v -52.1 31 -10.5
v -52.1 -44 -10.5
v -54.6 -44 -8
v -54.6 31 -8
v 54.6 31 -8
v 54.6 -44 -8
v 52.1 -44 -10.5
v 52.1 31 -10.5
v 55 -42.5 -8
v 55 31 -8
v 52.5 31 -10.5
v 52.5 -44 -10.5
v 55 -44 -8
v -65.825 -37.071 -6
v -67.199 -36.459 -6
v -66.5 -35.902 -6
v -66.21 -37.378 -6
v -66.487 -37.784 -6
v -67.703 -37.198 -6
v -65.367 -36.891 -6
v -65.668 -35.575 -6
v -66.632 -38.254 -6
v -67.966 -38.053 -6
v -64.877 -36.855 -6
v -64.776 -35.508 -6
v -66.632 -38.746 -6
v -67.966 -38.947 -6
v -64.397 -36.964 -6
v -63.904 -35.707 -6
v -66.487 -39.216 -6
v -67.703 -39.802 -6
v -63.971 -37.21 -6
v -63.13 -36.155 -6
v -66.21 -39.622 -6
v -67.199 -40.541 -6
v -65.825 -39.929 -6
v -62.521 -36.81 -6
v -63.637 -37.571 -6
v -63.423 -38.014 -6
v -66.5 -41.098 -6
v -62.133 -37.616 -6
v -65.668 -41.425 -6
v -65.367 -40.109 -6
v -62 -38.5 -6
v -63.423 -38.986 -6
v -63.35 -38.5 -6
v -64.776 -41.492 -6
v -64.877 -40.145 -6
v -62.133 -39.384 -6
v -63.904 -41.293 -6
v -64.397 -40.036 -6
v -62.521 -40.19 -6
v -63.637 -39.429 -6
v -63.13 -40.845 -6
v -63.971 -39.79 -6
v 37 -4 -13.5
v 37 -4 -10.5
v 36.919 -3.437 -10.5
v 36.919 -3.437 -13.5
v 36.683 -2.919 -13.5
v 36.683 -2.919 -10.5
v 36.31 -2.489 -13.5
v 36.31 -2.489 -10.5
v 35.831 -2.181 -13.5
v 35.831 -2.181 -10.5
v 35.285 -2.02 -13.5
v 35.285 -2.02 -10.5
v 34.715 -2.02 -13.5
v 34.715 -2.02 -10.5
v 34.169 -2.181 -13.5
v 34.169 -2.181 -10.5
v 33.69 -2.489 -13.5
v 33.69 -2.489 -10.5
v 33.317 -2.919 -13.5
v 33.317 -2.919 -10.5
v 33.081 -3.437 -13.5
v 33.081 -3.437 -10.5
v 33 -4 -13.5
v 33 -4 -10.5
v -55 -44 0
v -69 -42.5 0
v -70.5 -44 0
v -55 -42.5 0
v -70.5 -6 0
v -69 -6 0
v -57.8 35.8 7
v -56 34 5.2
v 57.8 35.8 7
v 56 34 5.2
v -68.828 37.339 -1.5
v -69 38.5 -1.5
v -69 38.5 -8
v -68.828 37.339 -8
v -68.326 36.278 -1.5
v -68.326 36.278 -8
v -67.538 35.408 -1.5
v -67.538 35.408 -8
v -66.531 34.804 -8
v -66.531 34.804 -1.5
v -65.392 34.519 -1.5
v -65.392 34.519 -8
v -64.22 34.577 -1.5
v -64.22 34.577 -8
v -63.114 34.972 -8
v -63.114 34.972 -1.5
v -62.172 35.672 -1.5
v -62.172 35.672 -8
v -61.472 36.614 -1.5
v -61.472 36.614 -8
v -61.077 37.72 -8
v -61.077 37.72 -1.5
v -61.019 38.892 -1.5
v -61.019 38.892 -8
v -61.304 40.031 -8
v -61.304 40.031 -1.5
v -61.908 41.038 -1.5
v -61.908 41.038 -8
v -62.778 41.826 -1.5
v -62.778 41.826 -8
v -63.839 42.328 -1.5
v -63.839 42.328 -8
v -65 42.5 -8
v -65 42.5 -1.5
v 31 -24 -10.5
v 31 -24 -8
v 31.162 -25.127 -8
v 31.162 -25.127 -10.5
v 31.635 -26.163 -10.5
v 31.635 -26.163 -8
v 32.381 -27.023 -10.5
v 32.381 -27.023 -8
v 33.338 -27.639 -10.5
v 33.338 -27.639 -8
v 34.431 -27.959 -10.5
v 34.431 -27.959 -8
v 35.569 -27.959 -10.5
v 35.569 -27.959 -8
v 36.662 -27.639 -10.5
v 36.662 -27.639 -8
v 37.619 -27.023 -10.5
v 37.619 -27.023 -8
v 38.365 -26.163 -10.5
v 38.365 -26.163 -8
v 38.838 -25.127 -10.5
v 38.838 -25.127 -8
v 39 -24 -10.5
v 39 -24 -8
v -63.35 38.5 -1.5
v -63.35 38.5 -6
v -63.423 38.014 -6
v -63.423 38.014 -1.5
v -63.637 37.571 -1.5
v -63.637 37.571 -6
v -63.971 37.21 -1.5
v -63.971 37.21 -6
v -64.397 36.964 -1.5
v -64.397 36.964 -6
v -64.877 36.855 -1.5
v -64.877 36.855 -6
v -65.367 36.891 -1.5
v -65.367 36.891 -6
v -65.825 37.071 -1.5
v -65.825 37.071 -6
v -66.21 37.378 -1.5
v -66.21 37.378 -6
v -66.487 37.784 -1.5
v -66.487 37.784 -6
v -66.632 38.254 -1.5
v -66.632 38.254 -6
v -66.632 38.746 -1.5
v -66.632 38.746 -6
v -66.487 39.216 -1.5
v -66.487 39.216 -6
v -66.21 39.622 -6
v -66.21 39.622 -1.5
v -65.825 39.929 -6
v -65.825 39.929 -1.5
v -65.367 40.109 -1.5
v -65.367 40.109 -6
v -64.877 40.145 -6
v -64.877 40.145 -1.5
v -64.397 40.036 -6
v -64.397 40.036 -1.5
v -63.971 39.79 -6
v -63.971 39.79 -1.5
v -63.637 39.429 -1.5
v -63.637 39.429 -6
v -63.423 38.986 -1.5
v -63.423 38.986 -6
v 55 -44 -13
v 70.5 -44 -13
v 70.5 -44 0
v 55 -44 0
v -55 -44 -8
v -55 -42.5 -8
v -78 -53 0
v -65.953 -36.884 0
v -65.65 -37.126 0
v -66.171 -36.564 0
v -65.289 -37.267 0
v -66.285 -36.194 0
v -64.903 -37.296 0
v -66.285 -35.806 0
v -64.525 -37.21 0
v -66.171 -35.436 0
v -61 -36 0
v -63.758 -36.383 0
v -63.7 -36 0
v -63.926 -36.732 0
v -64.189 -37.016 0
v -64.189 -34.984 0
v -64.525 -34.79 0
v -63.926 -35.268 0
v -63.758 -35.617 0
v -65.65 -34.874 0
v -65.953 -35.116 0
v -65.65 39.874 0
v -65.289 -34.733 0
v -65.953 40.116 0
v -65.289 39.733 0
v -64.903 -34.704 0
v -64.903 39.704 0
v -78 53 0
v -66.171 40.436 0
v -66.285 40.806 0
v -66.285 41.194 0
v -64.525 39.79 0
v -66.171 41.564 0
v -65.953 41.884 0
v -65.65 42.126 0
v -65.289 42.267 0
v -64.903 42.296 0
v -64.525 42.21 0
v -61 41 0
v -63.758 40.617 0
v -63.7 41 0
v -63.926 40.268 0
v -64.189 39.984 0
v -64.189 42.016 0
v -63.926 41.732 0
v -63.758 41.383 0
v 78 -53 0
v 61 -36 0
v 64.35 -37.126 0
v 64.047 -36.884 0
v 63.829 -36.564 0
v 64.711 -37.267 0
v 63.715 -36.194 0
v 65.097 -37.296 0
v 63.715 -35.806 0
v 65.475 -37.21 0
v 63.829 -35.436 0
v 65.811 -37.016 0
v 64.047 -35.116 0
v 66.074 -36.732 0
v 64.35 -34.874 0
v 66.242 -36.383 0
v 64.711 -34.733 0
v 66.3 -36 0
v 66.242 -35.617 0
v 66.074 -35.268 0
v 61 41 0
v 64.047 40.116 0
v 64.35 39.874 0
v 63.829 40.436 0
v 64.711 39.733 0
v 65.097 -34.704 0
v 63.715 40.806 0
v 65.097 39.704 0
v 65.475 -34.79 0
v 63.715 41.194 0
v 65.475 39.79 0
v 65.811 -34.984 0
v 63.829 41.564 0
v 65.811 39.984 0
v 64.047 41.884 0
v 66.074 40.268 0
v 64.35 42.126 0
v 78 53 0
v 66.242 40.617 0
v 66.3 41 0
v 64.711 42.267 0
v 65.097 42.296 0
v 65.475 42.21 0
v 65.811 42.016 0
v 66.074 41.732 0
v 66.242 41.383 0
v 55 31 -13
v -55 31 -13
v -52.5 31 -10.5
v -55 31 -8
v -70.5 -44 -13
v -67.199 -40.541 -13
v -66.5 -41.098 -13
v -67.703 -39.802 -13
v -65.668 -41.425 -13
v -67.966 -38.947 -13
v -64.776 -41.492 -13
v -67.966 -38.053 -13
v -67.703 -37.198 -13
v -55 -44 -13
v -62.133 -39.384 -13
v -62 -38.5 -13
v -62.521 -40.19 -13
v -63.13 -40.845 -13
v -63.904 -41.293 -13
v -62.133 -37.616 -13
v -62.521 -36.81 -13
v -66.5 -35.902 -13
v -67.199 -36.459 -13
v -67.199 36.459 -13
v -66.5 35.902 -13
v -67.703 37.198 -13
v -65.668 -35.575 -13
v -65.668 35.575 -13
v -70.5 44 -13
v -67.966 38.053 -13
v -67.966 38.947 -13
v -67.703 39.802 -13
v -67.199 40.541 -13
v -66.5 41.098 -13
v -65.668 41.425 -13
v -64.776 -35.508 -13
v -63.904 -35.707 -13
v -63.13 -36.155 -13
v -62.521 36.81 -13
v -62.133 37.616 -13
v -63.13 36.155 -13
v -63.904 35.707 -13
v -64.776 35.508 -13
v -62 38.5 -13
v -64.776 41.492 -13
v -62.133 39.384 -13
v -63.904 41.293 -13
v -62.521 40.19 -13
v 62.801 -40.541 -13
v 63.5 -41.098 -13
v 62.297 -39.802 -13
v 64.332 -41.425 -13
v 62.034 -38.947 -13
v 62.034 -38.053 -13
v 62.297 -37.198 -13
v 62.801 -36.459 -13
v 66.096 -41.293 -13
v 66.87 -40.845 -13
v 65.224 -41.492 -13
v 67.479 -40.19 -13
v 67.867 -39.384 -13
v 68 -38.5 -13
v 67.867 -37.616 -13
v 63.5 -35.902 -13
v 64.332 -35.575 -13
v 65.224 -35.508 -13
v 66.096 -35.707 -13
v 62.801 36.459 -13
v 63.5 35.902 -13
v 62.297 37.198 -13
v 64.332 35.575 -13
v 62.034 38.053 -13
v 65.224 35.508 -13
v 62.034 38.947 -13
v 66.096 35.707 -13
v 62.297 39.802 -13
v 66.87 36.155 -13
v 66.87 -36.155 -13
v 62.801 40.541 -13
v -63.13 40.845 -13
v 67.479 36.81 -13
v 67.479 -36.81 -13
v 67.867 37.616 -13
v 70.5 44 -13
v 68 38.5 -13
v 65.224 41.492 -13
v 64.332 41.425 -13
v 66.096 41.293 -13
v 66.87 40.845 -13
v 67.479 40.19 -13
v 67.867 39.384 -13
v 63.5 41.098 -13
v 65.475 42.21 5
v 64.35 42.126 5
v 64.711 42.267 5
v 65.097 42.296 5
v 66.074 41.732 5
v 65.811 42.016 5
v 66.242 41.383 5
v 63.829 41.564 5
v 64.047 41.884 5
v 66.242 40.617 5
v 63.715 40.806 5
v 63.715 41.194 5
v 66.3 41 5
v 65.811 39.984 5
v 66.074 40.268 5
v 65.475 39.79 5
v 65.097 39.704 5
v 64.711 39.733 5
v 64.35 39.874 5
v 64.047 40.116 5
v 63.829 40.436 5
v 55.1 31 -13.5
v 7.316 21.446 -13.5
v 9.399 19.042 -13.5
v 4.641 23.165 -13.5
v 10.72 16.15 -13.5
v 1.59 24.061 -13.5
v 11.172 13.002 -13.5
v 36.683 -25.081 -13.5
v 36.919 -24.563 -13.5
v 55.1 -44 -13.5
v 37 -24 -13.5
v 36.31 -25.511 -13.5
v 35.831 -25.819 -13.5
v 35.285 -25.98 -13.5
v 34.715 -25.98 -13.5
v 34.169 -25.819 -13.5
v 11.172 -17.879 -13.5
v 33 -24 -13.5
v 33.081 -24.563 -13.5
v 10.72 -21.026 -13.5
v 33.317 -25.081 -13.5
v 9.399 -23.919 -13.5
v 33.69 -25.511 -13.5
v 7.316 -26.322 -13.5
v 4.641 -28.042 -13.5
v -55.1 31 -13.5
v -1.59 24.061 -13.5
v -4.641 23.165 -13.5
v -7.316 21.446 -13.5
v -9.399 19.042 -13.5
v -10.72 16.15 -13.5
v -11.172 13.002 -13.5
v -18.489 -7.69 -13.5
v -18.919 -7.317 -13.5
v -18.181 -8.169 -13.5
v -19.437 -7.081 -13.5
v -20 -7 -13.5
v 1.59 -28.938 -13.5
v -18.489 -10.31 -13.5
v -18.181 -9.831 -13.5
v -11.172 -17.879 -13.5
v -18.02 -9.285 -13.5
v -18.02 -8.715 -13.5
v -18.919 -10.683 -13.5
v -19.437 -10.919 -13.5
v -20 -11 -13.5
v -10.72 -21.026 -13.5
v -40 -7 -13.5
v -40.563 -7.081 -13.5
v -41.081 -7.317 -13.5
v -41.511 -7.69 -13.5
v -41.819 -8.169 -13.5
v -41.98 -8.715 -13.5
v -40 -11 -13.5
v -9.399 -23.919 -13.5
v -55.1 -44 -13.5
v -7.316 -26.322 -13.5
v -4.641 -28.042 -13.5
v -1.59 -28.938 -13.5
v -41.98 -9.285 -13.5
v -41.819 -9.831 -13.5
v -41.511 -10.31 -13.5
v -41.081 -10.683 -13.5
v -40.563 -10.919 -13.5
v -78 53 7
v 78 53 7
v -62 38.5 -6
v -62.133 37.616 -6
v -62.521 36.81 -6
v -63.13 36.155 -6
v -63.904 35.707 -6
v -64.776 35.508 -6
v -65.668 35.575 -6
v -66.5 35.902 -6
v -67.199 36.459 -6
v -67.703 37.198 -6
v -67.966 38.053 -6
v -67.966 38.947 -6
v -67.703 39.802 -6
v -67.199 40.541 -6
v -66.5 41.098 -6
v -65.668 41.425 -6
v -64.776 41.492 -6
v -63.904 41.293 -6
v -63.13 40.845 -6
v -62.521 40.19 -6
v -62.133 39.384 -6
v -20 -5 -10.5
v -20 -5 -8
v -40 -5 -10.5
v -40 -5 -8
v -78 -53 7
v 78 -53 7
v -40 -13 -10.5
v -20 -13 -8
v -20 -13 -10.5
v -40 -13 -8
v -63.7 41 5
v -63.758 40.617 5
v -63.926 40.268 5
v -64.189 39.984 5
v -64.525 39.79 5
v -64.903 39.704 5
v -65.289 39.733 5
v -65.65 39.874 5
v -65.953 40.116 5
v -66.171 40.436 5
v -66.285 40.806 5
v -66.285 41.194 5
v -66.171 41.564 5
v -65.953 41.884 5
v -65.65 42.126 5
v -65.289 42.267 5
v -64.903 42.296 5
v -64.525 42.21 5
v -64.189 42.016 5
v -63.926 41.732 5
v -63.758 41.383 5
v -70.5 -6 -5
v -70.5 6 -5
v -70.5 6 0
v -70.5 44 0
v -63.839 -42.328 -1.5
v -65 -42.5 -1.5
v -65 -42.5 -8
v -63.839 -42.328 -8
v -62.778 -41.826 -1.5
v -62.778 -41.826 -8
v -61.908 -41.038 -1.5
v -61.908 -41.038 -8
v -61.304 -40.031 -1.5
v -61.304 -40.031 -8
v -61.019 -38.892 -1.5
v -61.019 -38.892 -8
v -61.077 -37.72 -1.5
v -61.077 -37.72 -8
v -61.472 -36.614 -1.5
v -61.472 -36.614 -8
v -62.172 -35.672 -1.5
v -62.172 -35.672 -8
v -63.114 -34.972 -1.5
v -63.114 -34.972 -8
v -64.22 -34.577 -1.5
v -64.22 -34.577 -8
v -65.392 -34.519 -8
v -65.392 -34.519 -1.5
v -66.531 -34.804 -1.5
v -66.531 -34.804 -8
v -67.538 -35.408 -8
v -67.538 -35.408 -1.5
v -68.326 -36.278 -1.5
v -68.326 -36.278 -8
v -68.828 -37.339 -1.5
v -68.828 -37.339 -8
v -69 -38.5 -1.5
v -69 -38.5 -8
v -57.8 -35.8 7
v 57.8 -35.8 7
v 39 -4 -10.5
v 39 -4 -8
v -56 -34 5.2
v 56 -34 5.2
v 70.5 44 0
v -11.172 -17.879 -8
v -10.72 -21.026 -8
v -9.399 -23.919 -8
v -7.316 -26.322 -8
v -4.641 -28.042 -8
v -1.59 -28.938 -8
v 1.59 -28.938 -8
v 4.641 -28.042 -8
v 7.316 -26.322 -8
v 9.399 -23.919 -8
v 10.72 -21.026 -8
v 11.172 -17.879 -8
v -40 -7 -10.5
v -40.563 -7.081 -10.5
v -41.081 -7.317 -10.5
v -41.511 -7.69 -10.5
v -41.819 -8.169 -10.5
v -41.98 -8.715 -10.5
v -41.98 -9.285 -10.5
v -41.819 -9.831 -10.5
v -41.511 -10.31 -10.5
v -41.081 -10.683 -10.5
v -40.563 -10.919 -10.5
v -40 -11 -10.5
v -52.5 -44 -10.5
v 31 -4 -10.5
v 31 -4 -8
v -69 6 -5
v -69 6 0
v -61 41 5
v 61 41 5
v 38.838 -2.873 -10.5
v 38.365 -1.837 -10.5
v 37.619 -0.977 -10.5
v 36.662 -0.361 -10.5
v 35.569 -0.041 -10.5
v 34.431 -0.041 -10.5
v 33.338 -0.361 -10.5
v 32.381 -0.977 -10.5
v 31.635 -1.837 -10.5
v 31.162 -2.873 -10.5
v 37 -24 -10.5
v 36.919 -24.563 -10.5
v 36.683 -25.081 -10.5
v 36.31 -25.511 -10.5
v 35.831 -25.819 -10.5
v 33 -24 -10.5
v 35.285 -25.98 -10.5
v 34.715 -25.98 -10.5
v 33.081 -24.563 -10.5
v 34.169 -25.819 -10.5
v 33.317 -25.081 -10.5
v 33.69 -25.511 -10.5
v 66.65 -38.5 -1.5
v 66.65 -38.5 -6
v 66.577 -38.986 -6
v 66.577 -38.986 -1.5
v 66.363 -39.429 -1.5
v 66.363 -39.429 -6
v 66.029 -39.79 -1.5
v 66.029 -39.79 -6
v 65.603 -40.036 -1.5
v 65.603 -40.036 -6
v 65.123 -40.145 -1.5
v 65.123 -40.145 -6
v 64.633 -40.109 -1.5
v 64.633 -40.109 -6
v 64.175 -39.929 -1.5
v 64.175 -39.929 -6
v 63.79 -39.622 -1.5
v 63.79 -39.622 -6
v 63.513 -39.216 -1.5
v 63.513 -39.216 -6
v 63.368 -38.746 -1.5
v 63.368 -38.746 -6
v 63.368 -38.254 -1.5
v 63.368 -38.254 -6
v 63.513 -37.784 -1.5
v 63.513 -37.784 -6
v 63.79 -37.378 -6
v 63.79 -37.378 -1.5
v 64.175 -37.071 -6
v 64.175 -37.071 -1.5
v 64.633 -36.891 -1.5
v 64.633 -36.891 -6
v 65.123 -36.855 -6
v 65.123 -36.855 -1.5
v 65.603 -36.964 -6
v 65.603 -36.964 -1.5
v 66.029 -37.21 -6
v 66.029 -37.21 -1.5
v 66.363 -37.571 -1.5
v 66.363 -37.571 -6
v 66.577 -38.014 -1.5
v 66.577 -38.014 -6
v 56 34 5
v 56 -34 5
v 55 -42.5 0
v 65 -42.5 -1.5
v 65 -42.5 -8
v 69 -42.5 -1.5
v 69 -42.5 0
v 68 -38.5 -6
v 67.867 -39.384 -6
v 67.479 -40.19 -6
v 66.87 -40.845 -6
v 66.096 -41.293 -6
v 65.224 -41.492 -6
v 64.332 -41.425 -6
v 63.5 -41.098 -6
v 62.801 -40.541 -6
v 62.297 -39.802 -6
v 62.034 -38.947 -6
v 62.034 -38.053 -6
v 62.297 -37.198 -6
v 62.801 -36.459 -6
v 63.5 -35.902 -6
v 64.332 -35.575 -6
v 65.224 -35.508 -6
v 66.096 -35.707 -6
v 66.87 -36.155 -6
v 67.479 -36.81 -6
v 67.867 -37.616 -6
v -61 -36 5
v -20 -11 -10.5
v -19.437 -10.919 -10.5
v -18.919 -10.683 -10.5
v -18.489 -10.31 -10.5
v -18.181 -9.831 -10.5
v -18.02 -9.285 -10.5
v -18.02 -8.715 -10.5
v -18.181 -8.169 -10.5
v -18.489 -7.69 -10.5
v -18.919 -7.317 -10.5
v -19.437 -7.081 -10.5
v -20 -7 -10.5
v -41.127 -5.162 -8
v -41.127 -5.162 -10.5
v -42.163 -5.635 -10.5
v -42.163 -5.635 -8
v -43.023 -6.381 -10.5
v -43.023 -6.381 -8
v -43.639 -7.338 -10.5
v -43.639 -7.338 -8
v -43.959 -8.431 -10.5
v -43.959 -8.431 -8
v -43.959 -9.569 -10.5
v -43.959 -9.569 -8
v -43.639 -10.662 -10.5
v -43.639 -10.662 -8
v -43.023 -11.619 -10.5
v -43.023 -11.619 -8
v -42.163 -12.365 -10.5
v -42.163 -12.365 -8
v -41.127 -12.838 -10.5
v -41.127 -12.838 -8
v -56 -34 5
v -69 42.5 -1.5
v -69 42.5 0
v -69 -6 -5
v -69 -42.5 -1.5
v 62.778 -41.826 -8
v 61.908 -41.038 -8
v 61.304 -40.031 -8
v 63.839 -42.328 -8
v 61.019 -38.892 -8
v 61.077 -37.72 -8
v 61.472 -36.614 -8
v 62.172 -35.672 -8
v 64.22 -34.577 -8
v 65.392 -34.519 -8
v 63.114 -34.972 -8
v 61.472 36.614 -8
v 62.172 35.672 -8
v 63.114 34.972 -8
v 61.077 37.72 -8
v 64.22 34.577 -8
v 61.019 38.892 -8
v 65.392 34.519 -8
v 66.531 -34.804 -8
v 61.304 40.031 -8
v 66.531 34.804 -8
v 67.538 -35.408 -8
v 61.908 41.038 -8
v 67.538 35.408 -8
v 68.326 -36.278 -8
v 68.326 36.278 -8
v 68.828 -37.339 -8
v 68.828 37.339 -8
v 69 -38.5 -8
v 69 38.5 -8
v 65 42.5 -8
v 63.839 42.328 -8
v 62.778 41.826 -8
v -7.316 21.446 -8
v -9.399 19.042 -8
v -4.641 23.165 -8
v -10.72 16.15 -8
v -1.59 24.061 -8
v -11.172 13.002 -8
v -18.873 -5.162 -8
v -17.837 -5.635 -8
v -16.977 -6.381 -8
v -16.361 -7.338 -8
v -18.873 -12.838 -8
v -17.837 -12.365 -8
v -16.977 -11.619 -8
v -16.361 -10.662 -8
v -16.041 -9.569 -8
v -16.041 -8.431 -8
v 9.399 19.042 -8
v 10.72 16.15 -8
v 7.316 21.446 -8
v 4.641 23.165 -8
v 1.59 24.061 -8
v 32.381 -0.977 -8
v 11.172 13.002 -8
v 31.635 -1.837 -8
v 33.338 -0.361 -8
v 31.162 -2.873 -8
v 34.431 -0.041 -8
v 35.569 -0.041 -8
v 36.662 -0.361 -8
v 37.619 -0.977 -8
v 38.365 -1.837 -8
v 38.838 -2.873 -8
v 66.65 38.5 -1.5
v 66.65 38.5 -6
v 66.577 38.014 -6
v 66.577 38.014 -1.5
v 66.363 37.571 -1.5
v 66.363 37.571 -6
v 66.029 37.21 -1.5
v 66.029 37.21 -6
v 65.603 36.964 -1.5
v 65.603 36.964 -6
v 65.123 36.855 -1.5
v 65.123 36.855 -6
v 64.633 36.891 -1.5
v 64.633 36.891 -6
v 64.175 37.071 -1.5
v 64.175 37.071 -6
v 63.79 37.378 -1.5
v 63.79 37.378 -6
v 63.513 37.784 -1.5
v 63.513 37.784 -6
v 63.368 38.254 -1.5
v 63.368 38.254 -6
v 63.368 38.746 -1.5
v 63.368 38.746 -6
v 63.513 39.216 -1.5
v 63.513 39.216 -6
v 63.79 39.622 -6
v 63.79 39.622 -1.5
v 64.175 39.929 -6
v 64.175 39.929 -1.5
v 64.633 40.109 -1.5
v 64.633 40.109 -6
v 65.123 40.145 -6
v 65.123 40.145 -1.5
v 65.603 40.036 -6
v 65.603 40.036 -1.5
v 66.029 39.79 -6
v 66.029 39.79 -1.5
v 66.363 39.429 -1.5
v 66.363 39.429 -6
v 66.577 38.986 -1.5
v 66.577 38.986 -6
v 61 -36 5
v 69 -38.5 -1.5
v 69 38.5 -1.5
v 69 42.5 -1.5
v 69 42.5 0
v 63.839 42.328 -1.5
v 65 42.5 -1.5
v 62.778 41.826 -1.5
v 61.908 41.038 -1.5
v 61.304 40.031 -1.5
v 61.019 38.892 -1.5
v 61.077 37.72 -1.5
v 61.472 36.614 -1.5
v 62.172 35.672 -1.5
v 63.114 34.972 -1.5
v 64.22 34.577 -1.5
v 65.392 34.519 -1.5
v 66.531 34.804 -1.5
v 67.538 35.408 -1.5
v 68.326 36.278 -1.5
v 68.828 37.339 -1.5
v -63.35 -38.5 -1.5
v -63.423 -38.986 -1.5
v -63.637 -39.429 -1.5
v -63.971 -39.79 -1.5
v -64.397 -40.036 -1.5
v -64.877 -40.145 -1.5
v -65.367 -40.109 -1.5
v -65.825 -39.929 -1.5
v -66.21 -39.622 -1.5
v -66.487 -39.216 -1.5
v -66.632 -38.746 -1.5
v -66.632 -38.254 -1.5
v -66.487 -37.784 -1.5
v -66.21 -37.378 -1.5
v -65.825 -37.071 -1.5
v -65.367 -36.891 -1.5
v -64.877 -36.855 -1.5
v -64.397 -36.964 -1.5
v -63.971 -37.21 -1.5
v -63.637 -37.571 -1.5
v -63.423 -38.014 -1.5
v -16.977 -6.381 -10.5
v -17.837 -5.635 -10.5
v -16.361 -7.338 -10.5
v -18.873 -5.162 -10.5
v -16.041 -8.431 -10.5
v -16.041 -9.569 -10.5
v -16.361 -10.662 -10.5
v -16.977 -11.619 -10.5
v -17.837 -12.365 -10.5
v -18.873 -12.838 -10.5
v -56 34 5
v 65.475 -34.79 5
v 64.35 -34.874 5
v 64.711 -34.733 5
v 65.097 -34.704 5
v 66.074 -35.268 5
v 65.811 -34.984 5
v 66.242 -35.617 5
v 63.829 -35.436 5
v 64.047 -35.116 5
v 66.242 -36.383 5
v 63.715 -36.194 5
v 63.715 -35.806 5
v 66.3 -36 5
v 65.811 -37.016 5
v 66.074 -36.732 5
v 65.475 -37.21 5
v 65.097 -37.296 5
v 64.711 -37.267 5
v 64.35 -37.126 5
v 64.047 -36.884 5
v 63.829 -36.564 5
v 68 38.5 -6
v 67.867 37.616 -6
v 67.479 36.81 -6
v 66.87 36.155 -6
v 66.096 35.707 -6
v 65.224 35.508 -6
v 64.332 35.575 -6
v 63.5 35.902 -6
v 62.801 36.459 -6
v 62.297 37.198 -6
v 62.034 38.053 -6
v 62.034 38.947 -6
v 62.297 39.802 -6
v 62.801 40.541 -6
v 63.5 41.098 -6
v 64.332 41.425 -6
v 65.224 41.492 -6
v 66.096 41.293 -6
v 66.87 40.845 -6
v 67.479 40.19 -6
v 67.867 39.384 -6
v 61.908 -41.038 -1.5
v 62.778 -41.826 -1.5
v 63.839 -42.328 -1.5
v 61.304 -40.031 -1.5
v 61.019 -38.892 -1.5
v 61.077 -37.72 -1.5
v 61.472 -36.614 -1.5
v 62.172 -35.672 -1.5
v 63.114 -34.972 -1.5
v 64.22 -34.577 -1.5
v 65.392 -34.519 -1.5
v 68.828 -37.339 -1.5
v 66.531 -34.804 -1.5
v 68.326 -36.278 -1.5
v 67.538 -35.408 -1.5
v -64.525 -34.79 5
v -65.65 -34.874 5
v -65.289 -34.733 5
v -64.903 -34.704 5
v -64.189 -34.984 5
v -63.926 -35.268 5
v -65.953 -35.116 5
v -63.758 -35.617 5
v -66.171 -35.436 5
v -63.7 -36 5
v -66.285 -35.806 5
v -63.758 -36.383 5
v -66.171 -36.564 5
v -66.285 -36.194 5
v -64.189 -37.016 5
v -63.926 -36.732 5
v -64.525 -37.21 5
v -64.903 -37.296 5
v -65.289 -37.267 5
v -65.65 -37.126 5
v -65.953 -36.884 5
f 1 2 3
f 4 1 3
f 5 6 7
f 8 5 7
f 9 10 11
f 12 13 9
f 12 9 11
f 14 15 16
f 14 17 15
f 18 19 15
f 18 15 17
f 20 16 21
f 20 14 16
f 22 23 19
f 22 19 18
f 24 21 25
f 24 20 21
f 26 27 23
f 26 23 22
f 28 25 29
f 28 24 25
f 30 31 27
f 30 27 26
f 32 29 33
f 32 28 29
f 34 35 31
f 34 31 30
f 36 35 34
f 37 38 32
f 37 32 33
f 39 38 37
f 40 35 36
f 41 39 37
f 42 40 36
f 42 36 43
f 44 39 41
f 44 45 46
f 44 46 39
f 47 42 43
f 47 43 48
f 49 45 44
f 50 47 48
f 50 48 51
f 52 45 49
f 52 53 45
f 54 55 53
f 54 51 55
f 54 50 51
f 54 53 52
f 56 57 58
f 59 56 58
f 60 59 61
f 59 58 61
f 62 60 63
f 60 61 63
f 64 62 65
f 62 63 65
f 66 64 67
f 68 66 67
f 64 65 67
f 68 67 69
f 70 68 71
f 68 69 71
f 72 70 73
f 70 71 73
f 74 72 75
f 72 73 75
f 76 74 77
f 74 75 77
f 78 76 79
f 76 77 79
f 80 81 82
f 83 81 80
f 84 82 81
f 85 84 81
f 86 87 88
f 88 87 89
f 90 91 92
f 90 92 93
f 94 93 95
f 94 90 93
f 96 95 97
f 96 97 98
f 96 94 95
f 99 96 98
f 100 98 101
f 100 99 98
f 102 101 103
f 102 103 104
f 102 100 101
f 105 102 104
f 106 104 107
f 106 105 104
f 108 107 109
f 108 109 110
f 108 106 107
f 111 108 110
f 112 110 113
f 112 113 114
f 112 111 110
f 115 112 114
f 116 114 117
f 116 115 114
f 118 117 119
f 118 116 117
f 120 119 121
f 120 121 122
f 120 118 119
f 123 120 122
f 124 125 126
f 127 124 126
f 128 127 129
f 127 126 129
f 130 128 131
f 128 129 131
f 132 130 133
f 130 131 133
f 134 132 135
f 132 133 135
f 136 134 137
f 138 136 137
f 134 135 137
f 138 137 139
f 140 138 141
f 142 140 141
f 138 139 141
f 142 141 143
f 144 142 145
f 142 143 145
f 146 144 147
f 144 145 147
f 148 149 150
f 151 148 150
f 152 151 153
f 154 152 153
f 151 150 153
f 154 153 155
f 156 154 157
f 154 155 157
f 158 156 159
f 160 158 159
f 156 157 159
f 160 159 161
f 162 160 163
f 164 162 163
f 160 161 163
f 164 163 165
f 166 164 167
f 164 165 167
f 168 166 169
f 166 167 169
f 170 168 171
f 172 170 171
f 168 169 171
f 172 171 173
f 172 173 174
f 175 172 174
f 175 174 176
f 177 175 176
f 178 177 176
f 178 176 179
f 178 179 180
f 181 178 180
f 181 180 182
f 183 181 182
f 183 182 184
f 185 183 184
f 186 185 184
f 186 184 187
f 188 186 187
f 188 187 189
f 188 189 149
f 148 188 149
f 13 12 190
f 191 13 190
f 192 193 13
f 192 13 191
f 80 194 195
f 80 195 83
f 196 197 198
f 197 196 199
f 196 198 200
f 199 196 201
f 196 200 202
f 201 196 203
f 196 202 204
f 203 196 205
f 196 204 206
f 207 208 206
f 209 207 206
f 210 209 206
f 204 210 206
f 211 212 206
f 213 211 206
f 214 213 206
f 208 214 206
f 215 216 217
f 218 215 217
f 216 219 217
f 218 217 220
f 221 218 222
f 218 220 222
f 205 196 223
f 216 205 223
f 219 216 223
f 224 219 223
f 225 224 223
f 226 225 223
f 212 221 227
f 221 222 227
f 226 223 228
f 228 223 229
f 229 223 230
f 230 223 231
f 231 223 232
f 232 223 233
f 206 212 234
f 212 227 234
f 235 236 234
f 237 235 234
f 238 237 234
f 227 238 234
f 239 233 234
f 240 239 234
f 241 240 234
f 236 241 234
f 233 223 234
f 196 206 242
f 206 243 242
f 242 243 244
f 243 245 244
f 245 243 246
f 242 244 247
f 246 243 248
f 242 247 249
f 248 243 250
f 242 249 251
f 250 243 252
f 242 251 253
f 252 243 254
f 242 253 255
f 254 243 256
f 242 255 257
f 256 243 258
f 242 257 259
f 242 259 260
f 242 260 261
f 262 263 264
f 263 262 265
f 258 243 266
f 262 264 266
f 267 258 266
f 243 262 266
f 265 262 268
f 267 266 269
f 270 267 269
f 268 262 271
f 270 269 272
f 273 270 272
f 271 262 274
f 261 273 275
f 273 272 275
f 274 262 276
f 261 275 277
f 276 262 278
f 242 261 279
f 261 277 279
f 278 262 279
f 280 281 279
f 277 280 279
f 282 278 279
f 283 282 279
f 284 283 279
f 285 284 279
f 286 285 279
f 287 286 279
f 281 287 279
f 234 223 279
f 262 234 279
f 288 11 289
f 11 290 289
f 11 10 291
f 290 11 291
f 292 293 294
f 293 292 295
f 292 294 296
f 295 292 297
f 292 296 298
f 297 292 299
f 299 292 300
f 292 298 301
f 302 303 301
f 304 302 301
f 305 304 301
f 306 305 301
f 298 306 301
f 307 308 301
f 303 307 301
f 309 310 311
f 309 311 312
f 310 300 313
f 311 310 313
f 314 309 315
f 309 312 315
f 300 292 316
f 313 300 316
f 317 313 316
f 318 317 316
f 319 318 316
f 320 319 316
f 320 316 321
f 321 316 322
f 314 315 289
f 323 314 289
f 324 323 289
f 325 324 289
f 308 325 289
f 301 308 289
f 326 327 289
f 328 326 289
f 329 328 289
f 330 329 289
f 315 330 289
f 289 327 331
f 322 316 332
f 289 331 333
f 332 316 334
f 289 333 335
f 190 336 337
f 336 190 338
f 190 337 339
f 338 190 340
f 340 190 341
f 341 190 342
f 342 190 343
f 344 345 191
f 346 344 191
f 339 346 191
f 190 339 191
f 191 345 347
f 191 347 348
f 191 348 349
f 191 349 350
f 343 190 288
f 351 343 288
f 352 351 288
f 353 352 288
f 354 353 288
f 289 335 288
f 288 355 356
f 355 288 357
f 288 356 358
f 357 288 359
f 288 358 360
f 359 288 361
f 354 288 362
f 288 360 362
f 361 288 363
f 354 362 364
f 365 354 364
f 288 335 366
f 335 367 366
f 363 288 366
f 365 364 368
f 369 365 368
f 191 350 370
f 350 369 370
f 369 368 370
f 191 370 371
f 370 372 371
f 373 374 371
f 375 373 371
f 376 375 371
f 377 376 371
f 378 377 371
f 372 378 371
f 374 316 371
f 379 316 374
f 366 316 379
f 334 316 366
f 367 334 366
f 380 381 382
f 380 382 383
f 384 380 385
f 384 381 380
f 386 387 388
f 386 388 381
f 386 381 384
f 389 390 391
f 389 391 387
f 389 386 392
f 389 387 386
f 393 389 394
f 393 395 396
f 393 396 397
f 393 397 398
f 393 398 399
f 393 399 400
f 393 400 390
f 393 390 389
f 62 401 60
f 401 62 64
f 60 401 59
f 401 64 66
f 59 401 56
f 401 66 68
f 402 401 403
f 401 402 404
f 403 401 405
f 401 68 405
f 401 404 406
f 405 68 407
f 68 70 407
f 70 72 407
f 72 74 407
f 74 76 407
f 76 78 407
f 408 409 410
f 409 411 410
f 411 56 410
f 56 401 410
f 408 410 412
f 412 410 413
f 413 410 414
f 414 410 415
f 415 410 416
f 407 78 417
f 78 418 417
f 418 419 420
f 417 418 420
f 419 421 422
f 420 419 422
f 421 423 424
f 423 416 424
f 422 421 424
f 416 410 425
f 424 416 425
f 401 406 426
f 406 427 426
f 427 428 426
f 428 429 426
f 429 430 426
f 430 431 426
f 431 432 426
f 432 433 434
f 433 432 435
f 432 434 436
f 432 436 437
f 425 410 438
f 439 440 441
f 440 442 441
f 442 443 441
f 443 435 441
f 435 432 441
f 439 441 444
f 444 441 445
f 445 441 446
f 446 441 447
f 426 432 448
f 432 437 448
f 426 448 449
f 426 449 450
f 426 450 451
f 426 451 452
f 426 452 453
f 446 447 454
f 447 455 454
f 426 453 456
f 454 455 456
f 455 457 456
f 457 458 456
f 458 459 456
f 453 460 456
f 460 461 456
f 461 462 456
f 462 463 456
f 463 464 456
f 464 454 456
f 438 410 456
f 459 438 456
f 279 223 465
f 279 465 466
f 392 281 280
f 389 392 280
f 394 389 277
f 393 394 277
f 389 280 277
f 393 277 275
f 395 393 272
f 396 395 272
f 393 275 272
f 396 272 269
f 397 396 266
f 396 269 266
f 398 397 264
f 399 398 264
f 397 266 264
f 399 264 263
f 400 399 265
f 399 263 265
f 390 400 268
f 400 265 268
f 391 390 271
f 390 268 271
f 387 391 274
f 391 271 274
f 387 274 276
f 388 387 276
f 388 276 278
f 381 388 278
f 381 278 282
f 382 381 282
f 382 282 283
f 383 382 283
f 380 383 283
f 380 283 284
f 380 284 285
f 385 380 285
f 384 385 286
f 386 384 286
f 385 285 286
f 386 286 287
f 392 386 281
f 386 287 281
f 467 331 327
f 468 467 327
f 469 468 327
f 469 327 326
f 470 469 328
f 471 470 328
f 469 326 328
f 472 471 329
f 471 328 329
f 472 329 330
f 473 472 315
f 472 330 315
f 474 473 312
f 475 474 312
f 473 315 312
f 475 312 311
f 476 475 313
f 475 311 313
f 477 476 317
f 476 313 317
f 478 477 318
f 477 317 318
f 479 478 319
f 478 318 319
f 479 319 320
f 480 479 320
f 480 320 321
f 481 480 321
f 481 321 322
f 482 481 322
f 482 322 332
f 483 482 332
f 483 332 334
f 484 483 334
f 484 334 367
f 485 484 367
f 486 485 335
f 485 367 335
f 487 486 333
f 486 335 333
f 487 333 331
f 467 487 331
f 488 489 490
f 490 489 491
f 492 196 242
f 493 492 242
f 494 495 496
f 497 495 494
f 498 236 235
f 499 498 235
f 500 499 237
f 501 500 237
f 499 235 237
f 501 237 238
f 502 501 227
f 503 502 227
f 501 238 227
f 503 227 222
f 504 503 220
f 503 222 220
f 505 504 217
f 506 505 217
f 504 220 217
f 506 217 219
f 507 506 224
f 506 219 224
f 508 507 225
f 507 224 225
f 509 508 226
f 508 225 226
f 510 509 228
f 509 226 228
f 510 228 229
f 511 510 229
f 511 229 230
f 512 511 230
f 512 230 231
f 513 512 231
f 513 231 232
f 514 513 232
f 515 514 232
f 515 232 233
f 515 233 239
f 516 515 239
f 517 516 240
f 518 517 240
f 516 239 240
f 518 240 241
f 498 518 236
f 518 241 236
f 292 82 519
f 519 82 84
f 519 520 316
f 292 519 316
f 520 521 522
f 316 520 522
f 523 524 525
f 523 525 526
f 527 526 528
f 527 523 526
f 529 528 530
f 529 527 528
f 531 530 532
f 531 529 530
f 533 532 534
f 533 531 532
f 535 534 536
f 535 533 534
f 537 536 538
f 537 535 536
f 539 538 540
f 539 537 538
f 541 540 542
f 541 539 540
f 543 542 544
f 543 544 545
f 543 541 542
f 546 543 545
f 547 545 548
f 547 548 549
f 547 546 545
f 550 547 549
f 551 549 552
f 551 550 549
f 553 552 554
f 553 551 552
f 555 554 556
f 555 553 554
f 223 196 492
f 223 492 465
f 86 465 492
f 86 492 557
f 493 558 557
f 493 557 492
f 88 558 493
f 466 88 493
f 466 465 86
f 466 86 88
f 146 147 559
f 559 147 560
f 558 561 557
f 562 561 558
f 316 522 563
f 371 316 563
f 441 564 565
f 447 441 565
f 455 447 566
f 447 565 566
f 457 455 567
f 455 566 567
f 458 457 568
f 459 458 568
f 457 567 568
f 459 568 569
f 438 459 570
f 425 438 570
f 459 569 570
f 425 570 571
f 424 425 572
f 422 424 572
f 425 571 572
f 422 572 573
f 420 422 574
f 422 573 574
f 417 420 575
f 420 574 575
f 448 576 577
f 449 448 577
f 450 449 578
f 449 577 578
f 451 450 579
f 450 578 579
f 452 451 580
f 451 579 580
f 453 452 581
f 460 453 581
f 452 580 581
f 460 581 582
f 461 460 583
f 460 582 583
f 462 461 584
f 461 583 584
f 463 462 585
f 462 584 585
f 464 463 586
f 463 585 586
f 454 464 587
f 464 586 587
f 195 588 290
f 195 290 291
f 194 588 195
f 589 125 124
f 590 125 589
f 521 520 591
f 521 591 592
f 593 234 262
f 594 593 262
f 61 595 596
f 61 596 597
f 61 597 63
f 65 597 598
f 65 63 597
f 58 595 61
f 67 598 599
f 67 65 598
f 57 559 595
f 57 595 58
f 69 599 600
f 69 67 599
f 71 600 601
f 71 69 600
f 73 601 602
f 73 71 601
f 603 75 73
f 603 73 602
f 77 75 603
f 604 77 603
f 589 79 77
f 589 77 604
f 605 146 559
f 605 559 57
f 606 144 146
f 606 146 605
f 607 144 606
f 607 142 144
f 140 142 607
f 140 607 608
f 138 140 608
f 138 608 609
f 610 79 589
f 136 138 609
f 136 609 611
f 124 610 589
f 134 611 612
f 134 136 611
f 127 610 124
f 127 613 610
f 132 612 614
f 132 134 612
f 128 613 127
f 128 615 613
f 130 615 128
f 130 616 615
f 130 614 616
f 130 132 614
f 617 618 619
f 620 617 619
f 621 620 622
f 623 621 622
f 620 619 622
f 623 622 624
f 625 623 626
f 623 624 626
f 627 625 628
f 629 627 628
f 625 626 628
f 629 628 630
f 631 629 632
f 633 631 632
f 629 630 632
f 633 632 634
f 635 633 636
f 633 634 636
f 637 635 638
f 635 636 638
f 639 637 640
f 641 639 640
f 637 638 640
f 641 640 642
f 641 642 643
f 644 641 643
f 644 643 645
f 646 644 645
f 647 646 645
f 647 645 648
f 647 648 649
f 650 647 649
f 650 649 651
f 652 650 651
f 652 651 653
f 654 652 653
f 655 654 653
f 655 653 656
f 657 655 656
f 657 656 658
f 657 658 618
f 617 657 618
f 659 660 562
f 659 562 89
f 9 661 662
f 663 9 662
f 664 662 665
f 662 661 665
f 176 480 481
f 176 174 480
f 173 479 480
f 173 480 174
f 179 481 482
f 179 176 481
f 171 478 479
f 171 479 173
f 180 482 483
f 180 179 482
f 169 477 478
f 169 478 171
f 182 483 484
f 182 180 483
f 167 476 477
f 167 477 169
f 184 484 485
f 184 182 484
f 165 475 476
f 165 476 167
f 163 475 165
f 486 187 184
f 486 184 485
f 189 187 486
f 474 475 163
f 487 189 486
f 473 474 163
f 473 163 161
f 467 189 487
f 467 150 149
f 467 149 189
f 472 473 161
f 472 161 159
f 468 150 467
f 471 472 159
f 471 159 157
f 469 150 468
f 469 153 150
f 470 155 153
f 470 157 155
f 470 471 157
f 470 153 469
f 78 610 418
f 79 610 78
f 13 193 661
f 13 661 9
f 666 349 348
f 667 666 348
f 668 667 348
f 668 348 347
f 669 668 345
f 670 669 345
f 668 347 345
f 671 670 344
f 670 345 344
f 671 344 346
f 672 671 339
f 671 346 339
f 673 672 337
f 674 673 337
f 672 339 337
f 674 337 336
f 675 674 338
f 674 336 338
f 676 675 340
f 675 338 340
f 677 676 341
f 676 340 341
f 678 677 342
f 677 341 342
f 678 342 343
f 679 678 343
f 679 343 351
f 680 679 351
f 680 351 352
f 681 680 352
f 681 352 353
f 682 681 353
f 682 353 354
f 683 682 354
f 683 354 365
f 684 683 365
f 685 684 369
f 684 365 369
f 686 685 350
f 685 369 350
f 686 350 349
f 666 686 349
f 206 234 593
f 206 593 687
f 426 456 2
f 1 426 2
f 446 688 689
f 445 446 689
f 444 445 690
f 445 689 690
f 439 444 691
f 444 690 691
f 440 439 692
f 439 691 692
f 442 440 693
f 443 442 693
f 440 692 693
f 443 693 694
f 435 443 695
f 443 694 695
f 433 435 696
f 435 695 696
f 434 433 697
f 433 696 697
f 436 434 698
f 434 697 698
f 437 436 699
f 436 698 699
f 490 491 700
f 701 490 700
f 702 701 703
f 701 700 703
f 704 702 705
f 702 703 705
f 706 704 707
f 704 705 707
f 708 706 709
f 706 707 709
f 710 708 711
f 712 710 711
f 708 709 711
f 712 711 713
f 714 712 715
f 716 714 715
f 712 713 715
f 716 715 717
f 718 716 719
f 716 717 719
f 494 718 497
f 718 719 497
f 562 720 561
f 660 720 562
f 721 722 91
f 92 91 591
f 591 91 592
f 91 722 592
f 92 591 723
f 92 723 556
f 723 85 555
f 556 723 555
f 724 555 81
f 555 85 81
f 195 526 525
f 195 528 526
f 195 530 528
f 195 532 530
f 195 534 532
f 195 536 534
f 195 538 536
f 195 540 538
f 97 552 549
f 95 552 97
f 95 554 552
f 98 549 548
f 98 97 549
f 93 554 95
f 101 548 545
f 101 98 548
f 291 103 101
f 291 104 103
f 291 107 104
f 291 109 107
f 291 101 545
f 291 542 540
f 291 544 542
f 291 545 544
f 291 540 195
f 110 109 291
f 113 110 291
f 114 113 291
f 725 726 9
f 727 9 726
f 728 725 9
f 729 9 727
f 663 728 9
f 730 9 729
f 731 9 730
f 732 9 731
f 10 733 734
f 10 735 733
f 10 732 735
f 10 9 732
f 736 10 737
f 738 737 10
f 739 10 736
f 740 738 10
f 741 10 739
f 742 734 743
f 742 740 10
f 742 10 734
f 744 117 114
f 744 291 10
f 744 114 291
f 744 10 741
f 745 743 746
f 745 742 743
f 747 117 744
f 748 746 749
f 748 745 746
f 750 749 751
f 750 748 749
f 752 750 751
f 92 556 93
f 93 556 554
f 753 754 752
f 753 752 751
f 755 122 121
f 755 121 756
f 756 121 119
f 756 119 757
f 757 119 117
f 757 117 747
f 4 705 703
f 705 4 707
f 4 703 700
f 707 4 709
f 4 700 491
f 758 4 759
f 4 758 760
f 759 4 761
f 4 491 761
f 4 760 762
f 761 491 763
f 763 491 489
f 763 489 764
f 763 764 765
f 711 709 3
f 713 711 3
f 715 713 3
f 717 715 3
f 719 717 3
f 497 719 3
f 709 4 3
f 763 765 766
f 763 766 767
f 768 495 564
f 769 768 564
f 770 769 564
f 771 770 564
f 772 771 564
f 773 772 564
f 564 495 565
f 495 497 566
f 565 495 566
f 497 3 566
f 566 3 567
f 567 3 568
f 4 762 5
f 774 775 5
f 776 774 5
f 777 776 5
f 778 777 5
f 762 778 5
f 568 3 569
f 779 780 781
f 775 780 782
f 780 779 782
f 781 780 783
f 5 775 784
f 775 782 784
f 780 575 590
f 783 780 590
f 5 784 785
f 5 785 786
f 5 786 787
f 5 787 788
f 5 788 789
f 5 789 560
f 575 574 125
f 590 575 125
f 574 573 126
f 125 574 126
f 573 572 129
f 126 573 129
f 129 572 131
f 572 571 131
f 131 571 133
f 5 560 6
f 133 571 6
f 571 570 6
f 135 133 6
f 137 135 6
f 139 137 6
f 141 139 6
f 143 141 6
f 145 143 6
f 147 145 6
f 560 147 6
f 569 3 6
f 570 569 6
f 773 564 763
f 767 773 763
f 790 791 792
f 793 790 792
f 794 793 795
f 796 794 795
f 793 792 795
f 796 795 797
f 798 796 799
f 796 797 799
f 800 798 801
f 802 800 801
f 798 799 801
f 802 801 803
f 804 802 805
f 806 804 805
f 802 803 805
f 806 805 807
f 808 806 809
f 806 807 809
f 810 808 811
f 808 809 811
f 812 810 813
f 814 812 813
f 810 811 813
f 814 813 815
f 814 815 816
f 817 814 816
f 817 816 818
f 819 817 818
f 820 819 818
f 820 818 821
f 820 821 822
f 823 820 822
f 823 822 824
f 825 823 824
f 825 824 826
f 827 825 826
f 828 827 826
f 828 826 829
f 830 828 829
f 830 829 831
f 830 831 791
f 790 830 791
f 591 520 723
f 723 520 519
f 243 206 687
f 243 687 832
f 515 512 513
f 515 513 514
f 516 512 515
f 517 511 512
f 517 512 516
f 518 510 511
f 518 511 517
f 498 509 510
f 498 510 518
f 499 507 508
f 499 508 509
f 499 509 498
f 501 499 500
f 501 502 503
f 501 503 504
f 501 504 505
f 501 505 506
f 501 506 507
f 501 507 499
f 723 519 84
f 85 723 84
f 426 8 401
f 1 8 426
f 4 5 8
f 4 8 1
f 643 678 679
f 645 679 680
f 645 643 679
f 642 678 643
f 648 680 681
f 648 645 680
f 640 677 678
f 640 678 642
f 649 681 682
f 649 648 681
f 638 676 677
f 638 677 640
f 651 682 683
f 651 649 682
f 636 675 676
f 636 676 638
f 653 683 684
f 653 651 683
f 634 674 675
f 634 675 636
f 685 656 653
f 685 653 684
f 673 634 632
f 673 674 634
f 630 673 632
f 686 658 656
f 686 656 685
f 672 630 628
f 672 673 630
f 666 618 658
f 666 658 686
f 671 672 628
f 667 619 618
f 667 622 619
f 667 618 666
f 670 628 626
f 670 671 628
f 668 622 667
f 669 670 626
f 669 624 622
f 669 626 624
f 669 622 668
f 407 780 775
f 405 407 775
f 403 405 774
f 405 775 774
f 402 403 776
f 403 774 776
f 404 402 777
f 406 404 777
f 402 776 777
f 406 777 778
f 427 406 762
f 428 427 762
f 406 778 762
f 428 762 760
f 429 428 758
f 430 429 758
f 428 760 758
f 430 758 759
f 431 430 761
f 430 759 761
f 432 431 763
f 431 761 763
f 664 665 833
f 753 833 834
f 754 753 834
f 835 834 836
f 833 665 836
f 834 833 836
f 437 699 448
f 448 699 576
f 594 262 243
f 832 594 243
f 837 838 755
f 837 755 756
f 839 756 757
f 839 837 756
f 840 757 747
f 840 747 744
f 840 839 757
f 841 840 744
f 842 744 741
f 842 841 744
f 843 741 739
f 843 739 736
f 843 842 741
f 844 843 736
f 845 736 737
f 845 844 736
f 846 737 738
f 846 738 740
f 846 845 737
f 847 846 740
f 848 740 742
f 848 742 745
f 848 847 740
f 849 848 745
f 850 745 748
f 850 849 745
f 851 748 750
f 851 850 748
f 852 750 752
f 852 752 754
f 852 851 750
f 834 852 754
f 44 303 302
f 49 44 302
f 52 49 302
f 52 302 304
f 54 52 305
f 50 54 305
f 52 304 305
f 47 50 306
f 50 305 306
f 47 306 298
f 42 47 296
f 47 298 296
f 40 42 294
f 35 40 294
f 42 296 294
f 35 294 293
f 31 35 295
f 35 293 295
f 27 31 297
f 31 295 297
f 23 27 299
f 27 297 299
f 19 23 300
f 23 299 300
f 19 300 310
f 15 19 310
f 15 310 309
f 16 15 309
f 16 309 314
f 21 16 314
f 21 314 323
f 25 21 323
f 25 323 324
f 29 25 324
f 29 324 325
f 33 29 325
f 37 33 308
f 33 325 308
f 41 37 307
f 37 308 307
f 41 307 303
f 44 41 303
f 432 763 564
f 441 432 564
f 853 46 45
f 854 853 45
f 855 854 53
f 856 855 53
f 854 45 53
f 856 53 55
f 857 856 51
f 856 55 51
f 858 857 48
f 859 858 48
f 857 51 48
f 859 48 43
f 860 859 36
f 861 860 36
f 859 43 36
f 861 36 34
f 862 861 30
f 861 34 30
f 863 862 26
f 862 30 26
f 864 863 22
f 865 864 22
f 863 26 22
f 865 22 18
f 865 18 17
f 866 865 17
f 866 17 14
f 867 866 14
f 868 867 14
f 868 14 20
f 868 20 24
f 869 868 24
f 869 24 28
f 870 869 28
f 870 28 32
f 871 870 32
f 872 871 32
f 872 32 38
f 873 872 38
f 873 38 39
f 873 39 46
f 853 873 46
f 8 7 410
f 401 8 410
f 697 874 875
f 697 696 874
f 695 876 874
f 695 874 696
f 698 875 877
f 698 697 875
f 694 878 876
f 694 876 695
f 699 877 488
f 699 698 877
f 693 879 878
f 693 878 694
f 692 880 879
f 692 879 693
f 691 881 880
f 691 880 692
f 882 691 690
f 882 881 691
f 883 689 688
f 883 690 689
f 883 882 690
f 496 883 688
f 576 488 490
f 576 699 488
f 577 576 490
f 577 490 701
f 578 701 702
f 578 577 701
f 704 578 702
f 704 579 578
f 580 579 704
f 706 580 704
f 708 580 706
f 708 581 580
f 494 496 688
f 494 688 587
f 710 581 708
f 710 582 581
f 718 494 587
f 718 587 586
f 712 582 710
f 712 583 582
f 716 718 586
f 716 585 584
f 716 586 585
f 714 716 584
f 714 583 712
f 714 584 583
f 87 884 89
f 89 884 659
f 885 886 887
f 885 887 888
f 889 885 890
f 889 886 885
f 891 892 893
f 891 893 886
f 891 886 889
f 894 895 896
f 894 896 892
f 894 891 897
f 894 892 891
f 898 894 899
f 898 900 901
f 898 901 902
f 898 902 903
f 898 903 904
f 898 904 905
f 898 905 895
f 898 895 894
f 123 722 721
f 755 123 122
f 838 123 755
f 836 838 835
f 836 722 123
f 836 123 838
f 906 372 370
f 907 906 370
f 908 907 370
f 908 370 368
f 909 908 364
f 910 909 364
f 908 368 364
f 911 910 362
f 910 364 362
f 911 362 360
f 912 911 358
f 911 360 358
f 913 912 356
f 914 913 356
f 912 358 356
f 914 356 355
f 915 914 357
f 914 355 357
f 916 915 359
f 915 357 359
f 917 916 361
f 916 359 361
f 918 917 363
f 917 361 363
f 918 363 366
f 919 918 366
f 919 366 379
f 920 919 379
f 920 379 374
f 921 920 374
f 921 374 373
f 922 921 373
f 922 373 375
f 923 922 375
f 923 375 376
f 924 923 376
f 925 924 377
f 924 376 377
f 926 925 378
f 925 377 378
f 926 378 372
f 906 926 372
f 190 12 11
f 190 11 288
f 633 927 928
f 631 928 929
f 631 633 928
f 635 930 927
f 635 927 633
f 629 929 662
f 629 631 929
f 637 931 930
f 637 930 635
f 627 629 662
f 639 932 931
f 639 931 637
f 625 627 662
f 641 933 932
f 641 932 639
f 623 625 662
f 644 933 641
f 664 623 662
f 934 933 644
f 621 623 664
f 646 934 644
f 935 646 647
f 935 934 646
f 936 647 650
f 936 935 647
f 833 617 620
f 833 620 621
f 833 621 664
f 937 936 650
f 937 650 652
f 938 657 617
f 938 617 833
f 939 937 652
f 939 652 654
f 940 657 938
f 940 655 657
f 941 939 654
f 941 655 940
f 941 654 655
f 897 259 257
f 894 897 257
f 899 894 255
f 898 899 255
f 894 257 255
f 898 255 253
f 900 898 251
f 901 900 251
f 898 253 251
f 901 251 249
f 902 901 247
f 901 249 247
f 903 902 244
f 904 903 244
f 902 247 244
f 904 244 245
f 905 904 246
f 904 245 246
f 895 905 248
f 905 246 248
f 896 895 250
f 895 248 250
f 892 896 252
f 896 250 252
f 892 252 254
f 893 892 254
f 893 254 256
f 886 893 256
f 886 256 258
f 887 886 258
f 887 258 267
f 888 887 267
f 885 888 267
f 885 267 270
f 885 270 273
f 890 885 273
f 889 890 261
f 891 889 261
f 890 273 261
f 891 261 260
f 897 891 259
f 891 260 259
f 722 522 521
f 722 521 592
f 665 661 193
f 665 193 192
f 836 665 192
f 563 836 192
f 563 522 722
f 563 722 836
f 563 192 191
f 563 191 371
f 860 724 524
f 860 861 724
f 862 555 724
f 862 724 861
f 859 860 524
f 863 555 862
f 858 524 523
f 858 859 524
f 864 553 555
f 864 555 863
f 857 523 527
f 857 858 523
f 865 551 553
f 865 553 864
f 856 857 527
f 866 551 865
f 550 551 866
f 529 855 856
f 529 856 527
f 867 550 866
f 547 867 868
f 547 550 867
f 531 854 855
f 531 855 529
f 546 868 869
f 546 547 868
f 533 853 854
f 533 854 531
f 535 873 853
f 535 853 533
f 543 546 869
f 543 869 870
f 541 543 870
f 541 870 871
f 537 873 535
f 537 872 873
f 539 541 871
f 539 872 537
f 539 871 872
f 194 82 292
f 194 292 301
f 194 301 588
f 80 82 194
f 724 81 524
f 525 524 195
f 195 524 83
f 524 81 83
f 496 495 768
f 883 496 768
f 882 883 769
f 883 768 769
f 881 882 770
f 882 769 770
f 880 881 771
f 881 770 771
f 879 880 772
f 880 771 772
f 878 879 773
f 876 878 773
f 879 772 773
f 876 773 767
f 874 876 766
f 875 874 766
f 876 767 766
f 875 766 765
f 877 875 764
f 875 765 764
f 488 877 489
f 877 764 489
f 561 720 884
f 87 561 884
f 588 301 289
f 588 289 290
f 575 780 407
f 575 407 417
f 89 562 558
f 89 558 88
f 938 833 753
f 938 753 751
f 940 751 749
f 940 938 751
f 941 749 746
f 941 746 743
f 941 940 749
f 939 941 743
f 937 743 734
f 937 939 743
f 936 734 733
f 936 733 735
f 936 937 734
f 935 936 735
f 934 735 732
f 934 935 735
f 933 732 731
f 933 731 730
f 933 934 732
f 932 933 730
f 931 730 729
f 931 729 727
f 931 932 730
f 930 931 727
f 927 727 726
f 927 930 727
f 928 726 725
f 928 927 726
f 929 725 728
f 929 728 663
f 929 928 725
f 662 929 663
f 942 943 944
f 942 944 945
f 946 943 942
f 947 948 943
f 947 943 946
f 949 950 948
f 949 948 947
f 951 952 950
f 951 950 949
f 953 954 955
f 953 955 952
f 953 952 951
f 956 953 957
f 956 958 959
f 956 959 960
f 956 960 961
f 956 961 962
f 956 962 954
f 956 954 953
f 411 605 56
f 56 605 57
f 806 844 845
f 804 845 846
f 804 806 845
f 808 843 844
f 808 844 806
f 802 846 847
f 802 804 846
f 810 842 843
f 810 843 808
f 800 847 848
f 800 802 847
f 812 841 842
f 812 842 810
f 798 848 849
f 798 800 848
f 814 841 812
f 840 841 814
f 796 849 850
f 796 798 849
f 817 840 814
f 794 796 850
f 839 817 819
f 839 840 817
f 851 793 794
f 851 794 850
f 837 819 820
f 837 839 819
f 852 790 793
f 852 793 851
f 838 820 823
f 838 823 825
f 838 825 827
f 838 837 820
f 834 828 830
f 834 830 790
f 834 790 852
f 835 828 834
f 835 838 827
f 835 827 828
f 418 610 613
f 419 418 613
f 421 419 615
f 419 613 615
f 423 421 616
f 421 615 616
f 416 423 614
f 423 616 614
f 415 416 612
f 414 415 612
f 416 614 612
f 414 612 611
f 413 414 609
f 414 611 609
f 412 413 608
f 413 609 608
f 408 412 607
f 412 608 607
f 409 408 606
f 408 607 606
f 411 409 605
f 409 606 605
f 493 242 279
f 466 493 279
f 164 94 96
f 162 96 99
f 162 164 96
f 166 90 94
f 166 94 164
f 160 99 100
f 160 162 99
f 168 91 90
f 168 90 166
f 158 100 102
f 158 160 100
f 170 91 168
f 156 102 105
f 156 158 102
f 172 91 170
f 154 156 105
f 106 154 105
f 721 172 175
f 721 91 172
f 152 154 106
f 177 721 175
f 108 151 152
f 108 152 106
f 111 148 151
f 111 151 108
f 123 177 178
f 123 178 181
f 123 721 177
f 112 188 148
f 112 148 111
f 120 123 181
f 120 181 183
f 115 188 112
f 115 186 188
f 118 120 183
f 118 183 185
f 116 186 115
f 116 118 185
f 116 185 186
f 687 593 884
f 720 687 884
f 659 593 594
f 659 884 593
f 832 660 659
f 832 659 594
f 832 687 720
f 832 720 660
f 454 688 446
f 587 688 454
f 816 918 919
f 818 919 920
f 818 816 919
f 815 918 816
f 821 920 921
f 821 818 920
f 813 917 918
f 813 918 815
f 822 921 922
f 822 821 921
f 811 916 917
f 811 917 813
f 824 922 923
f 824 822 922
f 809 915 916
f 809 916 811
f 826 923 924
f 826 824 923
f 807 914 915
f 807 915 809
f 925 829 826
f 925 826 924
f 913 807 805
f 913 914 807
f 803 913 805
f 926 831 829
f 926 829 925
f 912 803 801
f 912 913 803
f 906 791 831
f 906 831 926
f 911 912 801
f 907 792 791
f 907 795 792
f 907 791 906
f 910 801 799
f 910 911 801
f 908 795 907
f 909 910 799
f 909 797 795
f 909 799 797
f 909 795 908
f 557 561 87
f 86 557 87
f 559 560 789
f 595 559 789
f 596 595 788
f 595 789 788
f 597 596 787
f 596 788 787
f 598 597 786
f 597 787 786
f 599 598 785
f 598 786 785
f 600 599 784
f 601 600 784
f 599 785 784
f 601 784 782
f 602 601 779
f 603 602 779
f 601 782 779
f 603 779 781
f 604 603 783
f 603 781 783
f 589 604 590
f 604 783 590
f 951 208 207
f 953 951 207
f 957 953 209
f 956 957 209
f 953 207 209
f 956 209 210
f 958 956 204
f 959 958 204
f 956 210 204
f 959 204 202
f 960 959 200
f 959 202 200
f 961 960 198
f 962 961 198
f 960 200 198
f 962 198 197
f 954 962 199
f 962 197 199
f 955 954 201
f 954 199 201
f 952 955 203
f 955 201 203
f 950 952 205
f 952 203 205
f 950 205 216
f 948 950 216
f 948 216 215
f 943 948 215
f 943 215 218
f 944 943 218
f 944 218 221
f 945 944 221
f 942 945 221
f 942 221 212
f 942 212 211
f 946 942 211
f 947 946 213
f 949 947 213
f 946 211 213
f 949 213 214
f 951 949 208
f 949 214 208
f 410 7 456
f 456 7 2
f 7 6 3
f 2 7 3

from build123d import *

# Parameters (mm, degrees)
SKETCH_W        = 156
SKETCH_H        = 106
SKETCH_W_2      = 112
SKETCH_H_2      = 68
PAD_DEPTH       = 7
SKETCH002_R     = 1.3
SKETCH002_W     = 122
SKETCH002_H     = 77
POCKET_DEPTH    = 5
CHAMFER_SIZE    = 1.8
SKETCH004_W     = 141
SKETCH004_H     = 88
PAD001_DEPTH    = 13
POCKET001_DEPTH = 8
SKETCH005_W     = 138
SKETCH005_H     = 85
POCKET002_DEPTH = 1.5
SKETCH006_R     = 1.65
POCKET003_DEPTH = 13.001
SKETCH007_R     = 3
POCKET004_DEPTH = 7
POCKET006_DEPTH = 75
SKETCH010_W     = 12
SKETCH010_H     = 5
POCKET007_DEPTH = 1.5
PAD002_DEPTH    = 75
POCKET008_DEPTH = 2.5
POCKET009_DEPTH = 7.501


with BuildPart() as front:
    # Sketch → Pad (new body)
    with BuildSketch(Plane.XY):
        Rectangle(SKETCH_W, SKETCH_H)
        Rectangle(SKETCH_W_2, SKETCH_H_2, mode=Mode.SUBTRACT)
    extrude(amount=PAD_DEPTH)

    # Sketch002 (on Face9 of Pad) → Pocket (cut)
    with BuildSketch(Plane(origin=(0, 0, 0), x_dir=(1, 0, 0), z_dir=(0, 0, -1))):
        with Locations((-65, 36)):
            Circle(SKETCH002_R)
        with Locations((65, 36)):
            Circle(SKETCH002_R)
        with Locations((-65, -41)):
            Circle(SKETCH002_R)
        with Locations((65, -41)):
            Circle(SKETCH002_R)
        with Locations((0, -2.5)):
            Rectangle(SKETCH002_W, SKETCH002_H)
    extrude(amount=-POCKET_DEPTH, mode=Mode.SUBTRACT)

    # Chamfer
    chamfer_edges = [front.edges().sort_by_distance(p)[0] for p in [
        (-56, 0, 7),
        (0, 34, 7),
        (56, 0, 7),
        (0, -34, 7),
    ]]
    chamfer(chamfer_edges, length=CHAMFER_SIZE)


with BuildPart() as back:
    # Sketch004 → Pad001 (new body)
    with BuildSketch(Plane.XY):
        Rectangle(SKETCH004_W, SKETCH004_H)
    extrude(amount=-PAD001_DEPTH)

    # Sketch003 (on Face5 of Pad001) → Pocket001 (cut)
    with BuildSketch(Plane.XY):
        with BuildLine():
            Line((-69, 38.500018), (-69, -38.500018))
            ThreePointArc((-65.000018, -42.5), (-62.171573, -35.671573), (-69, -38.500018))
            Line((-65.000018, -42.5), (64.999982, -42.5))
            ThreePointArc((69, -38.500018), (62.171585, -35.67156), (64.999982, -42.5))
            Line((69, -38.500018), (69, 38.500018))
            ThreePointArc((64.999982, 42.5), (62.171585, 35.67156), (69, 38.500018))
            Line((64.999982, 42.5), (-64.999982, 42.5))
            ThreePointArc((-69, 38.500018), (-62.171585, 35.67156), (-64.999982, 42.5))
        make_face()
    extrude(amount=-POCKET001_DEPTH, mode=Mode.SUBTRACT)

    # Sketch005 (on Face5 of Pad001) → Pocket002 (cut)
    with BuildSketch(Plane.XY):
        Rectangle(SKETCH005_W, SKETCH005_H)
    extrude(amount=-POCKET002_DEPTH, mode=Mode.SUBTRACT)

    # Sketch006 (on Face5 of Pocket002) → Pocket003 (cut, through all)
    with BuildSketch(Plane(origin=(0, 0, -13), x_dir=(1, 0, 0), z_dir=(0, 0, -1))):
        with Locations((-65, 38.5)):
            Circle(SKETCH006_R)
        with Locations((65, 38.5)):
            Circle(SKETCH006_R)
        with Locations((65, -38.5)):
            Circle(SKETCH006_R)
        with Locations((-65, -38.5)):
            Circle(SKETCH006_R)
    extrude(amount=-POCKET003_DEPTH, mode=Mode.SUBTRACT)

    # Sketch007 (on Face5 of Pocket002) → Pocket004 (cut)
    with BuildSketch(Plane(origin=(0, 0, -13), x_dir=(1, 0, 0), z_dir=(0, 0, -1))):
        with Locations((-65, 38.5)):
            Circle(SKETCH007_R)
        with Locations((65, 38.5)):
            Circle(SKETCH007_R)
        with Locations((65, -38.5)):
            Circle(SKETCH007_R)
        with Locations((-65, -38.5)):
            Circle(SKETCH007_R)
    extrude(amount=-POCKET004_DEPTH, mode=Mode.SUBTRACT)

    # Sketch009 → Pocket006 (cut)
    with BuildSketch(Plane.XZ.offset(44)):
        Polygon((-52.5, -10.5), (-55, -8), (-55, 0), (55, 0), (55, -8), (52.5, -10.5), (55, -13), (-55, -13), align=None)
    extrude(amount=-POCKET006_DEPTH, mode=Mode.SUBTRACT)

    # Sketch010 (on Face2 of Pocket006) → Pocket007 (cut)
    with BuildSketch(Plane(origin=(-70.5, 0, 0), x_dir=(0, -1, 0), z_dir=(-1, 0, 0))):
        with Locations((0, -2.5)):
            Rectangle(SKETCH010_W, SKETCH010_H)
    extrude(amount=-POCKET007_DEPTH, mode=Mode.SUBTRACT)


with BuildPart() as mount:
    # Sketch011 → Pad002 (new body)
    with BuildSketch(Plane.XZ.offset(44)):
        Polygon((-54.6, -8), (54.6, -8), (52.1, -10.5), (55.1, -13.5), (-55.1, -13.5), (-52.1, -10.5), align=None)
    extrude(amount=-PAD002_DEPTH)

    # Sketch012 (on Face2 of Pad002) → Pocket008 (cut)
    with BuildSketch(Plane(origin=(0, -44, -8), x_dir=(-1, 0, 0), z_dir=(0, 0, 1))):
        with BuildLine():
            ThreePointArc((-31, -20), (-35, -16), (-39, -20))
            Line((-39, -20), (-39, -40))
            ThreePointArc((-39, -40), (-35, -44), (-31, -40))
            Line((-31, -20), (-31, -40))
        make_face()
        with BuildLine():
            ThreePointArc((20, -31), (16, -35), (20, -39))
            Line((20, -39), (40, -39))
            ThreePointArc((40, -39), (44, -35), (40, -31))
            Line((20, -31), (40, -31))
        make_face()
    extrude(amount=-POCKET008_DEPTH, mode=Mode.SUBTRACT)

    # Sketch013 → Pocket009 (cut, through all)
    with BuildSketch(Plane(origin=(0, -44, -6), x_dir=(-1, 0, 0), z_dir=(0, 0, 1))):
        with BuildLine():
            ThreePointArc((-33, -20), (-35, -18), (-37, -20))
            Line((-37, -20), (-37, -40))
            ThreePointArc((-37, -40), (-35, -42), (-33, -40))
            Line((-33, -20), (-33, -40))
        make_face()
        with BuildLine():
            ThreePointArc((20, -33), (18, -35), (20, -37))
            Line((20, -37), (40, -37))
            ThreePointArc((40, -37), (42, -35), (40, -33))
            Line((20, -33), (40, -33))
        make_face()
        with BuildLine():
            ThreePointArc((-11.172499, -57.001894), (0, -68.174393), (11.172499, -57.001894))
            Line((11.172499, -57.001894), (11.172499, -26.121185))
            ThreePointArc((11.172499, -26.121185), (0, -14.948686), (-11.172499, -26.121185))
            Line((-11.172499, -57.001894), (-11.172499, -26.121185))
        make_face()
    extrude(amount=-POCKET009_DEPTH, mode=Mode.SUBTRACT)


solid = Compound([front.part, back.part, mount.part])
